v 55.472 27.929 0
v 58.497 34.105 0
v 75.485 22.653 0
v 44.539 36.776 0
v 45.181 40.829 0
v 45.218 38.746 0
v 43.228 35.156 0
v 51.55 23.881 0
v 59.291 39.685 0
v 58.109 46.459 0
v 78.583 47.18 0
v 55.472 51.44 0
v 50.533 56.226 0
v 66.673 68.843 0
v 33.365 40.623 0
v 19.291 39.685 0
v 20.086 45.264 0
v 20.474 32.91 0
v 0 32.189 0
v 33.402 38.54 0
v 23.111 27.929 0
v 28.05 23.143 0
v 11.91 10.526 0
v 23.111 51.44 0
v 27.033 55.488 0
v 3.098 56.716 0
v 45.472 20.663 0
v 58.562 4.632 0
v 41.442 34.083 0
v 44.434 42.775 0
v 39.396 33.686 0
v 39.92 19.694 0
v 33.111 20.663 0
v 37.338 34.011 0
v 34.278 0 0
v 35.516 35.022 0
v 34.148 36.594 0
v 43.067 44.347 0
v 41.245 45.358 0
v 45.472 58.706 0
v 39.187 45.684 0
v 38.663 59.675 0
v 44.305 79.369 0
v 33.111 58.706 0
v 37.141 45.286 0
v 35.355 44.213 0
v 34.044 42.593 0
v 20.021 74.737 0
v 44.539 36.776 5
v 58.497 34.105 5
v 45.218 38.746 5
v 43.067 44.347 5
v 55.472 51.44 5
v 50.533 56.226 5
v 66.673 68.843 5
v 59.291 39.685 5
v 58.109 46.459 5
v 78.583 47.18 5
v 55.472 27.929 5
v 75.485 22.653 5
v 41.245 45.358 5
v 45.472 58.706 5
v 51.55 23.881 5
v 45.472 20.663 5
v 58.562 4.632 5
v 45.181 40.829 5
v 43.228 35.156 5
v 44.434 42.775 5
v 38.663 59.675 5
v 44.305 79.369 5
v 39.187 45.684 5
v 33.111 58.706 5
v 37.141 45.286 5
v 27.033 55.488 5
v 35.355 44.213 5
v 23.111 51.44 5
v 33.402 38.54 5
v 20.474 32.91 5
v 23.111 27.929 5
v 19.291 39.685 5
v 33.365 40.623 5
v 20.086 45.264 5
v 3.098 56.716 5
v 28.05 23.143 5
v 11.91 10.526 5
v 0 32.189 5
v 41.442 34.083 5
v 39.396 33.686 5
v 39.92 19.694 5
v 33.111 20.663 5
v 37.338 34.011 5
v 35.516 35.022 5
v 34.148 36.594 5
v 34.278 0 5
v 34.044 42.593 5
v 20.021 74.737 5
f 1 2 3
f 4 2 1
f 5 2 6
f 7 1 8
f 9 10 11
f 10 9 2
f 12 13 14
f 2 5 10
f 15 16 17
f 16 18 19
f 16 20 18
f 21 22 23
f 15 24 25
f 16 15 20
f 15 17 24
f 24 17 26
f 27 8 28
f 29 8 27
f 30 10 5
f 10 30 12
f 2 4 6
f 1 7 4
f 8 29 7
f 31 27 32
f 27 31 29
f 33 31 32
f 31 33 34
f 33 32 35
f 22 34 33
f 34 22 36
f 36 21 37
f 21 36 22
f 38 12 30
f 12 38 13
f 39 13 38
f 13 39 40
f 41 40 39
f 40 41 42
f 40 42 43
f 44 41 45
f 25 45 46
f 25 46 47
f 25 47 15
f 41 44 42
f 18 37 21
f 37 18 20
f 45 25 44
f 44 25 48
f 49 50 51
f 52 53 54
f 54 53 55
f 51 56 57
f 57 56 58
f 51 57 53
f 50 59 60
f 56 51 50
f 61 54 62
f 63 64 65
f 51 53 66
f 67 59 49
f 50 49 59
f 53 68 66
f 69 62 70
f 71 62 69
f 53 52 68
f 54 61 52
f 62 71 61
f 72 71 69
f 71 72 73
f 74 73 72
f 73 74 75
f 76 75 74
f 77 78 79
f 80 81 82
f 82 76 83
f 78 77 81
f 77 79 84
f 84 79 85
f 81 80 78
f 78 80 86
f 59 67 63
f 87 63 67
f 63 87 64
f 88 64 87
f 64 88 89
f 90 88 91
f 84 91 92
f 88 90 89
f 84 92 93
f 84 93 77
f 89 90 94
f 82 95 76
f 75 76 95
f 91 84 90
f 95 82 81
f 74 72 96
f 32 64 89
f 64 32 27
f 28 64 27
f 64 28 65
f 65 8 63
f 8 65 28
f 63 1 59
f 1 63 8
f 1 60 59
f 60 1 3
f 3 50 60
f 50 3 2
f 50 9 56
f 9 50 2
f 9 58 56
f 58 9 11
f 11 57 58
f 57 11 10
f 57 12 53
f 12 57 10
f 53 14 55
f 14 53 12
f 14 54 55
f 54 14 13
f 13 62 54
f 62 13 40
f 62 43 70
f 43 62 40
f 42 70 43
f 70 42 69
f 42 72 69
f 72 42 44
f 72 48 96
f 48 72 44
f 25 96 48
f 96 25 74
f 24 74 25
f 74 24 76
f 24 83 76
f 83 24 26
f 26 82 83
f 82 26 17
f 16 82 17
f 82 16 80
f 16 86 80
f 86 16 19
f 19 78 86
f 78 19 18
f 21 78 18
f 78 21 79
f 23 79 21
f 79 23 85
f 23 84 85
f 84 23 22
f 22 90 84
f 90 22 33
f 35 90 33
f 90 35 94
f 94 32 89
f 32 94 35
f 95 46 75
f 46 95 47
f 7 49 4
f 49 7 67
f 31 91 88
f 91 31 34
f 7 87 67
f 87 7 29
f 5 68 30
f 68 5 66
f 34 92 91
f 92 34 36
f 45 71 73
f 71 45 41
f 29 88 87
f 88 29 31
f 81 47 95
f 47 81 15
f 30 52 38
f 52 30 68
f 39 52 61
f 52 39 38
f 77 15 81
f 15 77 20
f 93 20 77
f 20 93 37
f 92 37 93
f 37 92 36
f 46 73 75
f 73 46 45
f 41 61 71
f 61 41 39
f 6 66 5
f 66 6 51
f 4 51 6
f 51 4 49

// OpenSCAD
$fn = 32;

// ----------------------------------------------------------------------
// Star wheel: 10-point ratchet, R40
// ----------------------------------------------------------------------

// --- parameters (mm) ---
n_points = 10;            // number of points / teeth
r_out = 40;               // tip radius
r_in = 20;                // root radius
bore_r = 6;               // centre bore radius
plate_t = 5;              // plate thickness, Z (extrusion height)
bore_d = 12;              // centre bore diameter

profile = [[59.291, 39.685], [78.583, 47.18], [58.109, 46.459], [55.472, 51.44], [66.673, 68.843], [50.533, 56.226], [45.472, 58.706], [44.305, 79.369], [38.663, 59.675], [33.111, 58.706], [20.021, 74.737], [27.033, 55.488], [23.111, 51.44], [3.098, 56.716], [20.086, 45.264], [19.291, 39.685], [0, 32.189], [20.474, 32.91], [23.111, 27.929], [11.91, 10.526], [28.05, 23.143], [33.111, 20.663], [34.278, 0], [39.92, 19.694], [45.472, 20.663], [58.562, 4.632], [51.55, 23.881], [55.472, 27.929], [75.485, 22.653], [58.497, 34.105]];  // primary outline, 30 points, counter clockwise
void_1 = [[45.181, 40.829], [44.434, 42.775], [43.067, 44.347], [41.245, 45.358], [39.187, 45.684], [37.141, 45.286], [35.355, 44.213], [34.044, 42.593], [33.365, 40.623], [33.402, 38.54], [34.148, 36.594], [35.516, 35.022], [37.338, 34.011], [39.396, 33.686], [41.442, 34.083], [43.228, 35.156], [44.539, 36.776], [45.218, 38.746]];  // centre bore, 18 points

// --- the one profile operation ---
difference() {
  linear_extrude(height = plate_t) polygon(points = profile);
  translate([0, 0, -1])
    linear_extrude(height = plate_t + 2) polygon(points = void_1);
}
